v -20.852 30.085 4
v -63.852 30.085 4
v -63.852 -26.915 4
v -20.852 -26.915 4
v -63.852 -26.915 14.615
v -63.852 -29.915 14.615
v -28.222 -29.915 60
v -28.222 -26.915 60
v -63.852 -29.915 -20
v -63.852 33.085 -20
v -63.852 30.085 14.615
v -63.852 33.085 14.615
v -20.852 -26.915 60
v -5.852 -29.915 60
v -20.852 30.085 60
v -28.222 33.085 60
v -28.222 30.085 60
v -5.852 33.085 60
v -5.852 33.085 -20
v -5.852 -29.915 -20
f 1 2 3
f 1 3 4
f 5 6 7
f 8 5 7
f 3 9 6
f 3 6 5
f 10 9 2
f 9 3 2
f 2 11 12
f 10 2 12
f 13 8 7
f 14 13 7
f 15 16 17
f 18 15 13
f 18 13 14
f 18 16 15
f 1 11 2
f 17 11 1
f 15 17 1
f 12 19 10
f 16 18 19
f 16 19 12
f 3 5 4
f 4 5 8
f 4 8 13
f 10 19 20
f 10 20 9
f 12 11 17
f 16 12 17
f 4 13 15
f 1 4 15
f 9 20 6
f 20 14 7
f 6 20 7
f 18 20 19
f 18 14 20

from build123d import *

# Parameters (mm, degrees)
SKETCH_1_W          = 58
SKETCH_1_H          = 63
EXTRUDE_1_DEPTH     = 60
SKETCH_3_W          = 43
SKETCH_3_H          = 57
CUT_EXTRUDE_1_DEPTH = 56
CUT_EXTRUDE_2_DEPTH = 64
SKETCH_5_W          = 58
SKETCH_5_H          = 63
EXTRUDE_2_DEPTH     = 20


with BuildPart() as part:
    # 草图1 → 凸台-拉伸1 (new body)
    with BuildSketch(Plane.XY):
        with Locations((-34.85212532, 1.584978346)):
            Rectangle(SKETCH_1_W, SKETCH_1_H)
    extrude(amount=EXTRUDE_1_DEPTH)

    # 草图3 → 切除-拉伸1 (cut)
    with BuildSketch(Plane.XY.offset(60)):
        with Locations((-42.35212532, 1.584978346)):
            Rectangle(SKETCH_3_W, SKETCH_3_H)
    extrude(amount=-CUT_EXTRUDE_1_DEPTH, mode=Mode.SUBTRACT)

    # 草图4 → 切除-拉伸2 (cut, through all)
    with BuildSketch(Plane.XZ.offset(29.915021654)):
        Polygon((-63.85212532, 60), (-63.85212532, 14.614911021), (-28.222040277, 60), align=None)
    extrude(amount=-CUT_EXTRUDE_2_DEPTH, mode=Mode.SUBTRACT)

    # 草图5 → 凸台-拉伸2 (add)
    with BuildSketch(Plane(origin=(0, 0, 0), x_dir=(-1, 0, 0), z_dir=(0, 0, -1))):
        with Locations((34.85212532, 1.584978346)):
            Rectangle(SKETCH_5_W, SKETCH_5_H)
    extrude(amount=EXTRUDE_2_DEPTH)


solid = part.part
